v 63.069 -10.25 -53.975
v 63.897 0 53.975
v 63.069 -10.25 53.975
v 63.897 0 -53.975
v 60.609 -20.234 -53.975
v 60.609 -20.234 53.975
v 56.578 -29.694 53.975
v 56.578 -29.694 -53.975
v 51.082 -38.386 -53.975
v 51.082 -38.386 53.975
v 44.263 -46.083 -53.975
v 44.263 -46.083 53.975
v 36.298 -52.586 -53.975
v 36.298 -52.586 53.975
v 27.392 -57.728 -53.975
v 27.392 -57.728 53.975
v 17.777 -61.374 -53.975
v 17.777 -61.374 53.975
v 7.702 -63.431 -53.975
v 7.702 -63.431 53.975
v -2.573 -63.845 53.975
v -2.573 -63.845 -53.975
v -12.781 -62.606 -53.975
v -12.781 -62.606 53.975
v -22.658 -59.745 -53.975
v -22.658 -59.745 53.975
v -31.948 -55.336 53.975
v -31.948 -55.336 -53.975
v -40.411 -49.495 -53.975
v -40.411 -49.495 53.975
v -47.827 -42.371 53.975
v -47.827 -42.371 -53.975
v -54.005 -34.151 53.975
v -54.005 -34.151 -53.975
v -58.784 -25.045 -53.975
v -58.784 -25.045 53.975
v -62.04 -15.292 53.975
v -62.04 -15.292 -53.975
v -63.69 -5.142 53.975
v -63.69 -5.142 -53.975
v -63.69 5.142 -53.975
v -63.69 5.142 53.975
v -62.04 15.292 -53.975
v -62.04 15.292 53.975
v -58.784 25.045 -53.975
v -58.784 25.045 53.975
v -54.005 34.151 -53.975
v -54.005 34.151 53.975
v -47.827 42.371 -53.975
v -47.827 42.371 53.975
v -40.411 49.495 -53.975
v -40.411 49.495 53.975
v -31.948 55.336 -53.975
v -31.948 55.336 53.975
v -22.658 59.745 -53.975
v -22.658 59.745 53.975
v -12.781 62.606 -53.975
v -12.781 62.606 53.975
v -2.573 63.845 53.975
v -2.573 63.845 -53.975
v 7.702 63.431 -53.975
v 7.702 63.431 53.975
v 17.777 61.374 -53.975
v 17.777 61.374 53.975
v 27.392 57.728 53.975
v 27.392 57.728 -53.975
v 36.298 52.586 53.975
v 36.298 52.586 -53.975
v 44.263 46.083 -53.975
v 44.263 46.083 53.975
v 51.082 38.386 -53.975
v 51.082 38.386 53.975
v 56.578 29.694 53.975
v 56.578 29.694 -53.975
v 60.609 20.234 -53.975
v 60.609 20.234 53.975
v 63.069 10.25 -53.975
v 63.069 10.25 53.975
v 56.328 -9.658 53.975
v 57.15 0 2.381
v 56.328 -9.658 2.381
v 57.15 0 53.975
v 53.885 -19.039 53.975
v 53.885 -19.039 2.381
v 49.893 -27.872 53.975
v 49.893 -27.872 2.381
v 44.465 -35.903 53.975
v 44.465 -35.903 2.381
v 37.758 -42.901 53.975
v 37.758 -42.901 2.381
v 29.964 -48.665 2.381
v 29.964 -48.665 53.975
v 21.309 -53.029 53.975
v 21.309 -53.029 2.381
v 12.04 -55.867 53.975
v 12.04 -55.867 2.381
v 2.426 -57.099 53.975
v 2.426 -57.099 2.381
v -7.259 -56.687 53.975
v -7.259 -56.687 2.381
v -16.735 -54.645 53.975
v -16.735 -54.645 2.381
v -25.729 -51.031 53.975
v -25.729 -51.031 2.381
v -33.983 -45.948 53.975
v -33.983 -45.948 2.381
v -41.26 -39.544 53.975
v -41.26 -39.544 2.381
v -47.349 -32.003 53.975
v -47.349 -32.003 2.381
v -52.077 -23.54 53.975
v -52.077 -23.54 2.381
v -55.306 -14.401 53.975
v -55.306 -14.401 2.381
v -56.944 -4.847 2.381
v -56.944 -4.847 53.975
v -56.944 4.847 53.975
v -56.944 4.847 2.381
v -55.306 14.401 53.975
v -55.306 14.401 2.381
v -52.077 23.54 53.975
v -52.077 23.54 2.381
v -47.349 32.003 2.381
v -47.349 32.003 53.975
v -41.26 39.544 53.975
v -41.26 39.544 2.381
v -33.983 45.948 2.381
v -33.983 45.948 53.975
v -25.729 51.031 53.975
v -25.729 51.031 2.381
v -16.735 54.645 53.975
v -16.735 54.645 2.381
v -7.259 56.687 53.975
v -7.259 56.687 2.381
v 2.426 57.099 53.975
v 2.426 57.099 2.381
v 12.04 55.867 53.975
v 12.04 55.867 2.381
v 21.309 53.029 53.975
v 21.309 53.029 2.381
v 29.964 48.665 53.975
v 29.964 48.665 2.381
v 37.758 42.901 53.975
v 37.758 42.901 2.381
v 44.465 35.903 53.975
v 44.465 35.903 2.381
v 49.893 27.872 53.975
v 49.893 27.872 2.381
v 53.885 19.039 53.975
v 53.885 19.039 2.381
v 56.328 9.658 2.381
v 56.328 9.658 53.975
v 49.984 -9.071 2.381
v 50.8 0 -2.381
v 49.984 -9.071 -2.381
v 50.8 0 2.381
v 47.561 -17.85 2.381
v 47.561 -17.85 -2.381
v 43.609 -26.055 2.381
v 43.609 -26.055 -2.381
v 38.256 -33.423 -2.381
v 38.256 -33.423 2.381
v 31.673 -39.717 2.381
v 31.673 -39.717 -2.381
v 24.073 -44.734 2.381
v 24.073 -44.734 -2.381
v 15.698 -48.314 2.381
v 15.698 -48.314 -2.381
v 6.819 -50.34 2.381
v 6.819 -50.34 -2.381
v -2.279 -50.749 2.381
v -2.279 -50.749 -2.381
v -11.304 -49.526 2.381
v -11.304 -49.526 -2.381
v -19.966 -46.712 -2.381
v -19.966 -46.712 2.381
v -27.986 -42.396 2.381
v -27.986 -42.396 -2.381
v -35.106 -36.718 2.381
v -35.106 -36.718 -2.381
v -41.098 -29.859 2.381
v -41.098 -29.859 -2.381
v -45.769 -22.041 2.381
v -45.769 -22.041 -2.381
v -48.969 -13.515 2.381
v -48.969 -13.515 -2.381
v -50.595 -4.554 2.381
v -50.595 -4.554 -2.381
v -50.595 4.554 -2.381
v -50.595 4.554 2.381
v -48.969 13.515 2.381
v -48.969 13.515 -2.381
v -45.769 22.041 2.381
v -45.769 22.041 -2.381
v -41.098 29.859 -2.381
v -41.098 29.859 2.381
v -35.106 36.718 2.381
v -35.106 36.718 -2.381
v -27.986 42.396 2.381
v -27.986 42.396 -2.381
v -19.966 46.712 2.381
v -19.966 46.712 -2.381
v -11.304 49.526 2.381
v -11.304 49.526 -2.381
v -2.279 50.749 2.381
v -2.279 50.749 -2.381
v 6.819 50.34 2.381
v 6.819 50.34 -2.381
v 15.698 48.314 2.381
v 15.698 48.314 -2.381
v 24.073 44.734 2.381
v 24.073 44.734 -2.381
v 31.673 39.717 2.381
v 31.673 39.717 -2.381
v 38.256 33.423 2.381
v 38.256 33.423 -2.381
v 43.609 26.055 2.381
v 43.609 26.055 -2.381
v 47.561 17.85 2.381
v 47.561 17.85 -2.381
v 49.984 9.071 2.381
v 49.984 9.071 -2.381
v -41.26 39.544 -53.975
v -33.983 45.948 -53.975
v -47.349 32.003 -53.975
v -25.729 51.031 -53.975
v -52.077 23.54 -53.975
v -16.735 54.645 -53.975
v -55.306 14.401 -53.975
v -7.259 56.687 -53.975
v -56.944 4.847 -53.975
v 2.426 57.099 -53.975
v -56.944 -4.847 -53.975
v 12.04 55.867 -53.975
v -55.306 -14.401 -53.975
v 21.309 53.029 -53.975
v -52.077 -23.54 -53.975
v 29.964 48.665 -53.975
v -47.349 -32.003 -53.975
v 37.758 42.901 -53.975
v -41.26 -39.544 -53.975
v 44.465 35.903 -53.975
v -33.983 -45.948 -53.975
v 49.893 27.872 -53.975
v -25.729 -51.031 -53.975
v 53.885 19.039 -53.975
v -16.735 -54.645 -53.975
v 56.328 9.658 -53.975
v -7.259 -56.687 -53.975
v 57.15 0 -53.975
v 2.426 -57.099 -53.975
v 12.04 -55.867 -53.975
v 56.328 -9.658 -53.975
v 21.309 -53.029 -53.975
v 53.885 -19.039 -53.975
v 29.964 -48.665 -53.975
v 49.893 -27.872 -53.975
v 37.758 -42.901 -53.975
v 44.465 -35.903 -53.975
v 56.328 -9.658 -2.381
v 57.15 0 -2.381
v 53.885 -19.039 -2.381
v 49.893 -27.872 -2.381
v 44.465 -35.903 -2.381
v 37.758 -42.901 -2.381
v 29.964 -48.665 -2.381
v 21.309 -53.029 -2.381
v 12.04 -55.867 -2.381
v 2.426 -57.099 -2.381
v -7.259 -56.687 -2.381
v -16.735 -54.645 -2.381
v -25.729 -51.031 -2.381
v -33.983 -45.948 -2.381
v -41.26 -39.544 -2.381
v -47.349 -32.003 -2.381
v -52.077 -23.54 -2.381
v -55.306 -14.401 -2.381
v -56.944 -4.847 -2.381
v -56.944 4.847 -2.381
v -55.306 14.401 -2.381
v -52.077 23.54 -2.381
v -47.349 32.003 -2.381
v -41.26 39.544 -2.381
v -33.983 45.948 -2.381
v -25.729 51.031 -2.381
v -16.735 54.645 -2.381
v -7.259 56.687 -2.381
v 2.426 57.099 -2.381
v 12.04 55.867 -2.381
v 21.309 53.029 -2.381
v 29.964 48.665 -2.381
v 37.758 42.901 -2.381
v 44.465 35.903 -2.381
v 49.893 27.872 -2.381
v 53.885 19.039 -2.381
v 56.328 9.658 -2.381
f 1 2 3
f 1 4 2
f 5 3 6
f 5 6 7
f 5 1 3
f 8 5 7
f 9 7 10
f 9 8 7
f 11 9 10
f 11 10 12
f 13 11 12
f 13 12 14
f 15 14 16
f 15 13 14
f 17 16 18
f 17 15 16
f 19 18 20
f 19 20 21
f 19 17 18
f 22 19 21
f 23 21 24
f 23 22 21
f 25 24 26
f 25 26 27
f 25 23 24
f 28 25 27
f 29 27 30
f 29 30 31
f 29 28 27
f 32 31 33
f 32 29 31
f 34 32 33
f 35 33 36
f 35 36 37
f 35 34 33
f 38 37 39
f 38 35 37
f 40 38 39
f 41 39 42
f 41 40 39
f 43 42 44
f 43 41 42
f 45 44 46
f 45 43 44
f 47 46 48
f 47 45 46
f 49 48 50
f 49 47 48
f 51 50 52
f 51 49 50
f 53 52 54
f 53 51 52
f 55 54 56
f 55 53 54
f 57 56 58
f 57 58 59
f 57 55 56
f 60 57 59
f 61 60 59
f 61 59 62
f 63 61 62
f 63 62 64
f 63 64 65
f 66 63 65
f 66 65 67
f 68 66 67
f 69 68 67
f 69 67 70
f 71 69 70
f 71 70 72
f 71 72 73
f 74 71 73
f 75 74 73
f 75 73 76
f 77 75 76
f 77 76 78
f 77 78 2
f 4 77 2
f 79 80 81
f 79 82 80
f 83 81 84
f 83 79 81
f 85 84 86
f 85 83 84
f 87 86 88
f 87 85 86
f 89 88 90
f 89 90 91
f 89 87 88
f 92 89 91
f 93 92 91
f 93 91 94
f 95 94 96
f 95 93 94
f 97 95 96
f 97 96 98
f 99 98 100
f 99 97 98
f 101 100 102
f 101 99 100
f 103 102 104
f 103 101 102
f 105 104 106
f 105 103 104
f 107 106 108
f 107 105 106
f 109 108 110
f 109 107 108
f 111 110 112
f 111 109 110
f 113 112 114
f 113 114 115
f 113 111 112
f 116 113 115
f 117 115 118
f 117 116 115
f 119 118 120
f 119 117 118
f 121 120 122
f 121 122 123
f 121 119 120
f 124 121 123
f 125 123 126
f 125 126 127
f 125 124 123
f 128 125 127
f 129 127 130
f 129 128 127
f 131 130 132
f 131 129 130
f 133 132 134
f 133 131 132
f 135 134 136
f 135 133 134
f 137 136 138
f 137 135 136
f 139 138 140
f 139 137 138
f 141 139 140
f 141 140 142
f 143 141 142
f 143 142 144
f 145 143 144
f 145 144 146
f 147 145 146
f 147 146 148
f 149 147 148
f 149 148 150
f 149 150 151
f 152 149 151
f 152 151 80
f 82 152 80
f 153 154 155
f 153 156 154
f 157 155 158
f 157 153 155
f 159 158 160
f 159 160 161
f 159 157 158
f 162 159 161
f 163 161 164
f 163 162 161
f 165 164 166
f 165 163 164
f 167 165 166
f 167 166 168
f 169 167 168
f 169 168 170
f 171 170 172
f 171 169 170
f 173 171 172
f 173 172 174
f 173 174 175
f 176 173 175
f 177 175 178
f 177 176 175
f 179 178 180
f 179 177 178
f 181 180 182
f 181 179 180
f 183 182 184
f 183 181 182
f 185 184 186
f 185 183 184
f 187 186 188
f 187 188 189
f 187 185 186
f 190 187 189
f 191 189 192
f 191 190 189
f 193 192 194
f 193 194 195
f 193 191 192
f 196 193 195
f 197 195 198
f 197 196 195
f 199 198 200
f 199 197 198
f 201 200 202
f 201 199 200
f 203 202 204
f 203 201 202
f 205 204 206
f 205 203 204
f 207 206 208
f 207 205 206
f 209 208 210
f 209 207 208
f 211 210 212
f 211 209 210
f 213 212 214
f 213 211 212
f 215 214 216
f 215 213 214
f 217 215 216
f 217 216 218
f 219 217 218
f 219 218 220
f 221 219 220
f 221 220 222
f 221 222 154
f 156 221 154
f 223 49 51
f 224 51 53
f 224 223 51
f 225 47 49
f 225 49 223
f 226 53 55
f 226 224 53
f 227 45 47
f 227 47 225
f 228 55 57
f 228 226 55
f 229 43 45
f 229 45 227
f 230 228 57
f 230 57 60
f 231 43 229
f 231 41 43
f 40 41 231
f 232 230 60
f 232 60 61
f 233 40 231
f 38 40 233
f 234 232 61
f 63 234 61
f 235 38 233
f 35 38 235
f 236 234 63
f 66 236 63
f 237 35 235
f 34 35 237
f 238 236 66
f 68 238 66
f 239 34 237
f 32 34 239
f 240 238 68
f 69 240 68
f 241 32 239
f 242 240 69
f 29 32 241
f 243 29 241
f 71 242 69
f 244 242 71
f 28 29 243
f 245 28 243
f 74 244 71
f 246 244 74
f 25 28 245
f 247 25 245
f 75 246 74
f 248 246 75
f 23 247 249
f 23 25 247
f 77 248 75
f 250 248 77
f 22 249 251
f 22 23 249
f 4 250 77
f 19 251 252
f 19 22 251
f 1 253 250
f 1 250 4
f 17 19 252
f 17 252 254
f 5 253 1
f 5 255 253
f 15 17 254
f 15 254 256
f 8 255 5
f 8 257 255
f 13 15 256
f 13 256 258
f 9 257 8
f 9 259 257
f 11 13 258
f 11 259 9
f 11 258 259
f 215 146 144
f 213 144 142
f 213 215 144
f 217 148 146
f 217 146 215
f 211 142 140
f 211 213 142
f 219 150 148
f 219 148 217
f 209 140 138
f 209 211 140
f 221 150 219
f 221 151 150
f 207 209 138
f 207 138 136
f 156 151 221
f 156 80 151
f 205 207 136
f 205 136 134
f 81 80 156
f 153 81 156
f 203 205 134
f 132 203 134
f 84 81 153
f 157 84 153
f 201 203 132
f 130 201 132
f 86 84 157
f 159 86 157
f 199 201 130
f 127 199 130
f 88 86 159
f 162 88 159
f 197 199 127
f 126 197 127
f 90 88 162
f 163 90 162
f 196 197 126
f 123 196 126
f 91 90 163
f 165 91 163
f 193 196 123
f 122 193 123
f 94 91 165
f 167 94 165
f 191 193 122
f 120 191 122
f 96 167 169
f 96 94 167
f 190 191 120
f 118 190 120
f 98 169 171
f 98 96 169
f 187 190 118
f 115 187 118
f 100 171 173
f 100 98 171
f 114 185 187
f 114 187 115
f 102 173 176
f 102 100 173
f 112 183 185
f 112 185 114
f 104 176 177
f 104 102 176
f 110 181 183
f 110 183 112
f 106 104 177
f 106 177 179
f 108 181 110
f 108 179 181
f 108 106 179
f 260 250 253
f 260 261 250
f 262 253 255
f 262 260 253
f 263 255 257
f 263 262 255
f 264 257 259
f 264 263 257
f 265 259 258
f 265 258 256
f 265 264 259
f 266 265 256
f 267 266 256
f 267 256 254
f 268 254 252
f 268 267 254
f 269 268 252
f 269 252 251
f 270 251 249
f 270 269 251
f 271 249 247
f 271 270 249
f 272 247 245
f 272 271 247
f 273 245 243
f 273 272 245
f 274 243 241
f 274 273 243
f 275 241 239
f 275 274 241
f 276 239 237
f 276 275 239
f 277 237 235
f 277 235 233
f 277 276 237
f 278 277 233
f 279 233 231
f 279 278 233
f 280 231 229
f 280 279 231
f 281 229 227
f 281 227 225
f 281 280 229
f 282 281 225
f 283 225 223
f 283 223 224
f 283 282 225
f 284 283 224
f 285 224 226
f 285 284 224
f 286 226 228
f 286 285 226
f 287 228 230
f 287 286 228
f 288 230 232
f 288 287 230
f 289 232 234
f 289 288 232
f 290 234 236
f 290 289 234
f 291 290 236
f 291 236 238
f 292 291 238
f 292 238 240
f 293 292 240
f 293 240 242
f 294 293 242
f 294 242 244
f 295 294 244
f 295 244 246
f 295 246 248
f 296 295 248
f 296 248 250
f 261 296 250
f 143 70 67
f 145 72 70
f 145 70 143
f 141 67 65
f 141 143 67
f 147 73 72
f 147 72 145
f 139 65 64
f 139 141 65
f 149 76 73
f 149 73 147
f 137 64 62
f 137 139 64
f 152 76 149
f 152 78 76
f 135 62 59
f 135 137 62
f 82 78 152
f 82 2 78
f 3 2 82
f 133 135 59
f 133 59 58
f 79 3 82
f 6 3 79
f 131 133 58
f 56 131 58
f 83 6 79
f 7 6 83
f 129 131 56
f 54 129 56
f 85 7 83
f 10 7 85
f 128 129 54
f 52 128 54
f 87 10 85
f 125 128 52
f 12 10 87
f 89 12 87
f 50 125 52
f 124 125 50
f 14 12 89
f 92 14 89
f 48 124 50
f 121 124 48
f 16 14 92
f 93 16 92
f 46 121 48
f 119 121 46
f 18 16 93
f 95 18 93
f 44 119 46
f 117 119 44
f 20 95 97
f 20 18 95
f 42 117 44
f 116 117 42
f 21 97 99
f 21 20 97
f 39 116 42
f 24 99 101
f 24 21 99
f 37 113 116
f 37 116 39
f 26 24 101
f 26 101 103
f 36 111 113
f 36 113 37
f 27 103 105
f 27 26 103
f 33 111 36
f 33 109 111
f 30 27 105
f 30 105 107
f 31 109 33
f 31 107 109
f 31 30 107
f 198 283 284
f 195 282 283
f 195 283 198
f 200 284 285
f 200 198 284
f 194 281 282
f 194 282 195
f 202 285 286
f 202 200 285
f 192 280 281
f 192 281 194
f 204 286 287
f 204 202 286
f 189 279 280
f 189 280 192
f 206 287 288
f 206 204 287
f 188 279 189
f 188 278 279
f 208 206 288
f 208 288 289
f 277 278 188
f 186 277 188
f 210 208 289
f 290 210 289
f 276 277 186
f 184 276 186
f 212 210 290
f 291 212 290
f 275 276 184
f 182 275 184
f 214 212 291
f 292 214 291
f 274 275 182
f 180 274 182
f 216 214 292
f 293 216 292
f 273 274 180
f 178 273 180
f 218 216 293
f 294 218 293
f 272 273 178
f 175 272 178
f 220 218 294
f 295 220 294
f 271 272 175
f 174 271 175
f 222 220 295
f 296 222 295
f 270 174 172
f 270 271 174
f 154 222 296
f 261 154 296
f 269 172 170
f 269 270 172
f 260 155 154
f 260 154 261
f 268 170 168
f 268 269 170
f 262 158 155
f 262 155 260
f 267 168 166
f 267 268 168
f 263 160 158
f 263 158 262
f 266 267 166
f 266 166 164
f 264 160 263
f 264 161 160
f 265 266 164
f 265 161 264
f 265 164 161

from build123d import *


with BuildPart() as part:
    # Sketch2 → Revolve1 (revolve)
    with BuildSketch(Plane(origin=(0, 0, 0), x_dir=(0, 0, -1), z_dir=(1, 0, 0)), mode=Mode.PRIVATE) as revolve1_sk:
        Polygon((-53.975, 63.896875), (53.975, 63.896875), (53.975, 57.15), (2.38125, 57.15), (2.38125, 50.8), (-2.38125, 50.8), (-2.38125, 57.15), (-53.975, 57.15), align=None)
    revolve(revolve1_sk.sketch.rotate(Axis((0, 0, 62.594581749), (0, 0, -1)), 90), axis=Axis((0, 0, 62.594581749), (0, 0, -1)))  # turned: the seam where the file's is


solid = part.part
